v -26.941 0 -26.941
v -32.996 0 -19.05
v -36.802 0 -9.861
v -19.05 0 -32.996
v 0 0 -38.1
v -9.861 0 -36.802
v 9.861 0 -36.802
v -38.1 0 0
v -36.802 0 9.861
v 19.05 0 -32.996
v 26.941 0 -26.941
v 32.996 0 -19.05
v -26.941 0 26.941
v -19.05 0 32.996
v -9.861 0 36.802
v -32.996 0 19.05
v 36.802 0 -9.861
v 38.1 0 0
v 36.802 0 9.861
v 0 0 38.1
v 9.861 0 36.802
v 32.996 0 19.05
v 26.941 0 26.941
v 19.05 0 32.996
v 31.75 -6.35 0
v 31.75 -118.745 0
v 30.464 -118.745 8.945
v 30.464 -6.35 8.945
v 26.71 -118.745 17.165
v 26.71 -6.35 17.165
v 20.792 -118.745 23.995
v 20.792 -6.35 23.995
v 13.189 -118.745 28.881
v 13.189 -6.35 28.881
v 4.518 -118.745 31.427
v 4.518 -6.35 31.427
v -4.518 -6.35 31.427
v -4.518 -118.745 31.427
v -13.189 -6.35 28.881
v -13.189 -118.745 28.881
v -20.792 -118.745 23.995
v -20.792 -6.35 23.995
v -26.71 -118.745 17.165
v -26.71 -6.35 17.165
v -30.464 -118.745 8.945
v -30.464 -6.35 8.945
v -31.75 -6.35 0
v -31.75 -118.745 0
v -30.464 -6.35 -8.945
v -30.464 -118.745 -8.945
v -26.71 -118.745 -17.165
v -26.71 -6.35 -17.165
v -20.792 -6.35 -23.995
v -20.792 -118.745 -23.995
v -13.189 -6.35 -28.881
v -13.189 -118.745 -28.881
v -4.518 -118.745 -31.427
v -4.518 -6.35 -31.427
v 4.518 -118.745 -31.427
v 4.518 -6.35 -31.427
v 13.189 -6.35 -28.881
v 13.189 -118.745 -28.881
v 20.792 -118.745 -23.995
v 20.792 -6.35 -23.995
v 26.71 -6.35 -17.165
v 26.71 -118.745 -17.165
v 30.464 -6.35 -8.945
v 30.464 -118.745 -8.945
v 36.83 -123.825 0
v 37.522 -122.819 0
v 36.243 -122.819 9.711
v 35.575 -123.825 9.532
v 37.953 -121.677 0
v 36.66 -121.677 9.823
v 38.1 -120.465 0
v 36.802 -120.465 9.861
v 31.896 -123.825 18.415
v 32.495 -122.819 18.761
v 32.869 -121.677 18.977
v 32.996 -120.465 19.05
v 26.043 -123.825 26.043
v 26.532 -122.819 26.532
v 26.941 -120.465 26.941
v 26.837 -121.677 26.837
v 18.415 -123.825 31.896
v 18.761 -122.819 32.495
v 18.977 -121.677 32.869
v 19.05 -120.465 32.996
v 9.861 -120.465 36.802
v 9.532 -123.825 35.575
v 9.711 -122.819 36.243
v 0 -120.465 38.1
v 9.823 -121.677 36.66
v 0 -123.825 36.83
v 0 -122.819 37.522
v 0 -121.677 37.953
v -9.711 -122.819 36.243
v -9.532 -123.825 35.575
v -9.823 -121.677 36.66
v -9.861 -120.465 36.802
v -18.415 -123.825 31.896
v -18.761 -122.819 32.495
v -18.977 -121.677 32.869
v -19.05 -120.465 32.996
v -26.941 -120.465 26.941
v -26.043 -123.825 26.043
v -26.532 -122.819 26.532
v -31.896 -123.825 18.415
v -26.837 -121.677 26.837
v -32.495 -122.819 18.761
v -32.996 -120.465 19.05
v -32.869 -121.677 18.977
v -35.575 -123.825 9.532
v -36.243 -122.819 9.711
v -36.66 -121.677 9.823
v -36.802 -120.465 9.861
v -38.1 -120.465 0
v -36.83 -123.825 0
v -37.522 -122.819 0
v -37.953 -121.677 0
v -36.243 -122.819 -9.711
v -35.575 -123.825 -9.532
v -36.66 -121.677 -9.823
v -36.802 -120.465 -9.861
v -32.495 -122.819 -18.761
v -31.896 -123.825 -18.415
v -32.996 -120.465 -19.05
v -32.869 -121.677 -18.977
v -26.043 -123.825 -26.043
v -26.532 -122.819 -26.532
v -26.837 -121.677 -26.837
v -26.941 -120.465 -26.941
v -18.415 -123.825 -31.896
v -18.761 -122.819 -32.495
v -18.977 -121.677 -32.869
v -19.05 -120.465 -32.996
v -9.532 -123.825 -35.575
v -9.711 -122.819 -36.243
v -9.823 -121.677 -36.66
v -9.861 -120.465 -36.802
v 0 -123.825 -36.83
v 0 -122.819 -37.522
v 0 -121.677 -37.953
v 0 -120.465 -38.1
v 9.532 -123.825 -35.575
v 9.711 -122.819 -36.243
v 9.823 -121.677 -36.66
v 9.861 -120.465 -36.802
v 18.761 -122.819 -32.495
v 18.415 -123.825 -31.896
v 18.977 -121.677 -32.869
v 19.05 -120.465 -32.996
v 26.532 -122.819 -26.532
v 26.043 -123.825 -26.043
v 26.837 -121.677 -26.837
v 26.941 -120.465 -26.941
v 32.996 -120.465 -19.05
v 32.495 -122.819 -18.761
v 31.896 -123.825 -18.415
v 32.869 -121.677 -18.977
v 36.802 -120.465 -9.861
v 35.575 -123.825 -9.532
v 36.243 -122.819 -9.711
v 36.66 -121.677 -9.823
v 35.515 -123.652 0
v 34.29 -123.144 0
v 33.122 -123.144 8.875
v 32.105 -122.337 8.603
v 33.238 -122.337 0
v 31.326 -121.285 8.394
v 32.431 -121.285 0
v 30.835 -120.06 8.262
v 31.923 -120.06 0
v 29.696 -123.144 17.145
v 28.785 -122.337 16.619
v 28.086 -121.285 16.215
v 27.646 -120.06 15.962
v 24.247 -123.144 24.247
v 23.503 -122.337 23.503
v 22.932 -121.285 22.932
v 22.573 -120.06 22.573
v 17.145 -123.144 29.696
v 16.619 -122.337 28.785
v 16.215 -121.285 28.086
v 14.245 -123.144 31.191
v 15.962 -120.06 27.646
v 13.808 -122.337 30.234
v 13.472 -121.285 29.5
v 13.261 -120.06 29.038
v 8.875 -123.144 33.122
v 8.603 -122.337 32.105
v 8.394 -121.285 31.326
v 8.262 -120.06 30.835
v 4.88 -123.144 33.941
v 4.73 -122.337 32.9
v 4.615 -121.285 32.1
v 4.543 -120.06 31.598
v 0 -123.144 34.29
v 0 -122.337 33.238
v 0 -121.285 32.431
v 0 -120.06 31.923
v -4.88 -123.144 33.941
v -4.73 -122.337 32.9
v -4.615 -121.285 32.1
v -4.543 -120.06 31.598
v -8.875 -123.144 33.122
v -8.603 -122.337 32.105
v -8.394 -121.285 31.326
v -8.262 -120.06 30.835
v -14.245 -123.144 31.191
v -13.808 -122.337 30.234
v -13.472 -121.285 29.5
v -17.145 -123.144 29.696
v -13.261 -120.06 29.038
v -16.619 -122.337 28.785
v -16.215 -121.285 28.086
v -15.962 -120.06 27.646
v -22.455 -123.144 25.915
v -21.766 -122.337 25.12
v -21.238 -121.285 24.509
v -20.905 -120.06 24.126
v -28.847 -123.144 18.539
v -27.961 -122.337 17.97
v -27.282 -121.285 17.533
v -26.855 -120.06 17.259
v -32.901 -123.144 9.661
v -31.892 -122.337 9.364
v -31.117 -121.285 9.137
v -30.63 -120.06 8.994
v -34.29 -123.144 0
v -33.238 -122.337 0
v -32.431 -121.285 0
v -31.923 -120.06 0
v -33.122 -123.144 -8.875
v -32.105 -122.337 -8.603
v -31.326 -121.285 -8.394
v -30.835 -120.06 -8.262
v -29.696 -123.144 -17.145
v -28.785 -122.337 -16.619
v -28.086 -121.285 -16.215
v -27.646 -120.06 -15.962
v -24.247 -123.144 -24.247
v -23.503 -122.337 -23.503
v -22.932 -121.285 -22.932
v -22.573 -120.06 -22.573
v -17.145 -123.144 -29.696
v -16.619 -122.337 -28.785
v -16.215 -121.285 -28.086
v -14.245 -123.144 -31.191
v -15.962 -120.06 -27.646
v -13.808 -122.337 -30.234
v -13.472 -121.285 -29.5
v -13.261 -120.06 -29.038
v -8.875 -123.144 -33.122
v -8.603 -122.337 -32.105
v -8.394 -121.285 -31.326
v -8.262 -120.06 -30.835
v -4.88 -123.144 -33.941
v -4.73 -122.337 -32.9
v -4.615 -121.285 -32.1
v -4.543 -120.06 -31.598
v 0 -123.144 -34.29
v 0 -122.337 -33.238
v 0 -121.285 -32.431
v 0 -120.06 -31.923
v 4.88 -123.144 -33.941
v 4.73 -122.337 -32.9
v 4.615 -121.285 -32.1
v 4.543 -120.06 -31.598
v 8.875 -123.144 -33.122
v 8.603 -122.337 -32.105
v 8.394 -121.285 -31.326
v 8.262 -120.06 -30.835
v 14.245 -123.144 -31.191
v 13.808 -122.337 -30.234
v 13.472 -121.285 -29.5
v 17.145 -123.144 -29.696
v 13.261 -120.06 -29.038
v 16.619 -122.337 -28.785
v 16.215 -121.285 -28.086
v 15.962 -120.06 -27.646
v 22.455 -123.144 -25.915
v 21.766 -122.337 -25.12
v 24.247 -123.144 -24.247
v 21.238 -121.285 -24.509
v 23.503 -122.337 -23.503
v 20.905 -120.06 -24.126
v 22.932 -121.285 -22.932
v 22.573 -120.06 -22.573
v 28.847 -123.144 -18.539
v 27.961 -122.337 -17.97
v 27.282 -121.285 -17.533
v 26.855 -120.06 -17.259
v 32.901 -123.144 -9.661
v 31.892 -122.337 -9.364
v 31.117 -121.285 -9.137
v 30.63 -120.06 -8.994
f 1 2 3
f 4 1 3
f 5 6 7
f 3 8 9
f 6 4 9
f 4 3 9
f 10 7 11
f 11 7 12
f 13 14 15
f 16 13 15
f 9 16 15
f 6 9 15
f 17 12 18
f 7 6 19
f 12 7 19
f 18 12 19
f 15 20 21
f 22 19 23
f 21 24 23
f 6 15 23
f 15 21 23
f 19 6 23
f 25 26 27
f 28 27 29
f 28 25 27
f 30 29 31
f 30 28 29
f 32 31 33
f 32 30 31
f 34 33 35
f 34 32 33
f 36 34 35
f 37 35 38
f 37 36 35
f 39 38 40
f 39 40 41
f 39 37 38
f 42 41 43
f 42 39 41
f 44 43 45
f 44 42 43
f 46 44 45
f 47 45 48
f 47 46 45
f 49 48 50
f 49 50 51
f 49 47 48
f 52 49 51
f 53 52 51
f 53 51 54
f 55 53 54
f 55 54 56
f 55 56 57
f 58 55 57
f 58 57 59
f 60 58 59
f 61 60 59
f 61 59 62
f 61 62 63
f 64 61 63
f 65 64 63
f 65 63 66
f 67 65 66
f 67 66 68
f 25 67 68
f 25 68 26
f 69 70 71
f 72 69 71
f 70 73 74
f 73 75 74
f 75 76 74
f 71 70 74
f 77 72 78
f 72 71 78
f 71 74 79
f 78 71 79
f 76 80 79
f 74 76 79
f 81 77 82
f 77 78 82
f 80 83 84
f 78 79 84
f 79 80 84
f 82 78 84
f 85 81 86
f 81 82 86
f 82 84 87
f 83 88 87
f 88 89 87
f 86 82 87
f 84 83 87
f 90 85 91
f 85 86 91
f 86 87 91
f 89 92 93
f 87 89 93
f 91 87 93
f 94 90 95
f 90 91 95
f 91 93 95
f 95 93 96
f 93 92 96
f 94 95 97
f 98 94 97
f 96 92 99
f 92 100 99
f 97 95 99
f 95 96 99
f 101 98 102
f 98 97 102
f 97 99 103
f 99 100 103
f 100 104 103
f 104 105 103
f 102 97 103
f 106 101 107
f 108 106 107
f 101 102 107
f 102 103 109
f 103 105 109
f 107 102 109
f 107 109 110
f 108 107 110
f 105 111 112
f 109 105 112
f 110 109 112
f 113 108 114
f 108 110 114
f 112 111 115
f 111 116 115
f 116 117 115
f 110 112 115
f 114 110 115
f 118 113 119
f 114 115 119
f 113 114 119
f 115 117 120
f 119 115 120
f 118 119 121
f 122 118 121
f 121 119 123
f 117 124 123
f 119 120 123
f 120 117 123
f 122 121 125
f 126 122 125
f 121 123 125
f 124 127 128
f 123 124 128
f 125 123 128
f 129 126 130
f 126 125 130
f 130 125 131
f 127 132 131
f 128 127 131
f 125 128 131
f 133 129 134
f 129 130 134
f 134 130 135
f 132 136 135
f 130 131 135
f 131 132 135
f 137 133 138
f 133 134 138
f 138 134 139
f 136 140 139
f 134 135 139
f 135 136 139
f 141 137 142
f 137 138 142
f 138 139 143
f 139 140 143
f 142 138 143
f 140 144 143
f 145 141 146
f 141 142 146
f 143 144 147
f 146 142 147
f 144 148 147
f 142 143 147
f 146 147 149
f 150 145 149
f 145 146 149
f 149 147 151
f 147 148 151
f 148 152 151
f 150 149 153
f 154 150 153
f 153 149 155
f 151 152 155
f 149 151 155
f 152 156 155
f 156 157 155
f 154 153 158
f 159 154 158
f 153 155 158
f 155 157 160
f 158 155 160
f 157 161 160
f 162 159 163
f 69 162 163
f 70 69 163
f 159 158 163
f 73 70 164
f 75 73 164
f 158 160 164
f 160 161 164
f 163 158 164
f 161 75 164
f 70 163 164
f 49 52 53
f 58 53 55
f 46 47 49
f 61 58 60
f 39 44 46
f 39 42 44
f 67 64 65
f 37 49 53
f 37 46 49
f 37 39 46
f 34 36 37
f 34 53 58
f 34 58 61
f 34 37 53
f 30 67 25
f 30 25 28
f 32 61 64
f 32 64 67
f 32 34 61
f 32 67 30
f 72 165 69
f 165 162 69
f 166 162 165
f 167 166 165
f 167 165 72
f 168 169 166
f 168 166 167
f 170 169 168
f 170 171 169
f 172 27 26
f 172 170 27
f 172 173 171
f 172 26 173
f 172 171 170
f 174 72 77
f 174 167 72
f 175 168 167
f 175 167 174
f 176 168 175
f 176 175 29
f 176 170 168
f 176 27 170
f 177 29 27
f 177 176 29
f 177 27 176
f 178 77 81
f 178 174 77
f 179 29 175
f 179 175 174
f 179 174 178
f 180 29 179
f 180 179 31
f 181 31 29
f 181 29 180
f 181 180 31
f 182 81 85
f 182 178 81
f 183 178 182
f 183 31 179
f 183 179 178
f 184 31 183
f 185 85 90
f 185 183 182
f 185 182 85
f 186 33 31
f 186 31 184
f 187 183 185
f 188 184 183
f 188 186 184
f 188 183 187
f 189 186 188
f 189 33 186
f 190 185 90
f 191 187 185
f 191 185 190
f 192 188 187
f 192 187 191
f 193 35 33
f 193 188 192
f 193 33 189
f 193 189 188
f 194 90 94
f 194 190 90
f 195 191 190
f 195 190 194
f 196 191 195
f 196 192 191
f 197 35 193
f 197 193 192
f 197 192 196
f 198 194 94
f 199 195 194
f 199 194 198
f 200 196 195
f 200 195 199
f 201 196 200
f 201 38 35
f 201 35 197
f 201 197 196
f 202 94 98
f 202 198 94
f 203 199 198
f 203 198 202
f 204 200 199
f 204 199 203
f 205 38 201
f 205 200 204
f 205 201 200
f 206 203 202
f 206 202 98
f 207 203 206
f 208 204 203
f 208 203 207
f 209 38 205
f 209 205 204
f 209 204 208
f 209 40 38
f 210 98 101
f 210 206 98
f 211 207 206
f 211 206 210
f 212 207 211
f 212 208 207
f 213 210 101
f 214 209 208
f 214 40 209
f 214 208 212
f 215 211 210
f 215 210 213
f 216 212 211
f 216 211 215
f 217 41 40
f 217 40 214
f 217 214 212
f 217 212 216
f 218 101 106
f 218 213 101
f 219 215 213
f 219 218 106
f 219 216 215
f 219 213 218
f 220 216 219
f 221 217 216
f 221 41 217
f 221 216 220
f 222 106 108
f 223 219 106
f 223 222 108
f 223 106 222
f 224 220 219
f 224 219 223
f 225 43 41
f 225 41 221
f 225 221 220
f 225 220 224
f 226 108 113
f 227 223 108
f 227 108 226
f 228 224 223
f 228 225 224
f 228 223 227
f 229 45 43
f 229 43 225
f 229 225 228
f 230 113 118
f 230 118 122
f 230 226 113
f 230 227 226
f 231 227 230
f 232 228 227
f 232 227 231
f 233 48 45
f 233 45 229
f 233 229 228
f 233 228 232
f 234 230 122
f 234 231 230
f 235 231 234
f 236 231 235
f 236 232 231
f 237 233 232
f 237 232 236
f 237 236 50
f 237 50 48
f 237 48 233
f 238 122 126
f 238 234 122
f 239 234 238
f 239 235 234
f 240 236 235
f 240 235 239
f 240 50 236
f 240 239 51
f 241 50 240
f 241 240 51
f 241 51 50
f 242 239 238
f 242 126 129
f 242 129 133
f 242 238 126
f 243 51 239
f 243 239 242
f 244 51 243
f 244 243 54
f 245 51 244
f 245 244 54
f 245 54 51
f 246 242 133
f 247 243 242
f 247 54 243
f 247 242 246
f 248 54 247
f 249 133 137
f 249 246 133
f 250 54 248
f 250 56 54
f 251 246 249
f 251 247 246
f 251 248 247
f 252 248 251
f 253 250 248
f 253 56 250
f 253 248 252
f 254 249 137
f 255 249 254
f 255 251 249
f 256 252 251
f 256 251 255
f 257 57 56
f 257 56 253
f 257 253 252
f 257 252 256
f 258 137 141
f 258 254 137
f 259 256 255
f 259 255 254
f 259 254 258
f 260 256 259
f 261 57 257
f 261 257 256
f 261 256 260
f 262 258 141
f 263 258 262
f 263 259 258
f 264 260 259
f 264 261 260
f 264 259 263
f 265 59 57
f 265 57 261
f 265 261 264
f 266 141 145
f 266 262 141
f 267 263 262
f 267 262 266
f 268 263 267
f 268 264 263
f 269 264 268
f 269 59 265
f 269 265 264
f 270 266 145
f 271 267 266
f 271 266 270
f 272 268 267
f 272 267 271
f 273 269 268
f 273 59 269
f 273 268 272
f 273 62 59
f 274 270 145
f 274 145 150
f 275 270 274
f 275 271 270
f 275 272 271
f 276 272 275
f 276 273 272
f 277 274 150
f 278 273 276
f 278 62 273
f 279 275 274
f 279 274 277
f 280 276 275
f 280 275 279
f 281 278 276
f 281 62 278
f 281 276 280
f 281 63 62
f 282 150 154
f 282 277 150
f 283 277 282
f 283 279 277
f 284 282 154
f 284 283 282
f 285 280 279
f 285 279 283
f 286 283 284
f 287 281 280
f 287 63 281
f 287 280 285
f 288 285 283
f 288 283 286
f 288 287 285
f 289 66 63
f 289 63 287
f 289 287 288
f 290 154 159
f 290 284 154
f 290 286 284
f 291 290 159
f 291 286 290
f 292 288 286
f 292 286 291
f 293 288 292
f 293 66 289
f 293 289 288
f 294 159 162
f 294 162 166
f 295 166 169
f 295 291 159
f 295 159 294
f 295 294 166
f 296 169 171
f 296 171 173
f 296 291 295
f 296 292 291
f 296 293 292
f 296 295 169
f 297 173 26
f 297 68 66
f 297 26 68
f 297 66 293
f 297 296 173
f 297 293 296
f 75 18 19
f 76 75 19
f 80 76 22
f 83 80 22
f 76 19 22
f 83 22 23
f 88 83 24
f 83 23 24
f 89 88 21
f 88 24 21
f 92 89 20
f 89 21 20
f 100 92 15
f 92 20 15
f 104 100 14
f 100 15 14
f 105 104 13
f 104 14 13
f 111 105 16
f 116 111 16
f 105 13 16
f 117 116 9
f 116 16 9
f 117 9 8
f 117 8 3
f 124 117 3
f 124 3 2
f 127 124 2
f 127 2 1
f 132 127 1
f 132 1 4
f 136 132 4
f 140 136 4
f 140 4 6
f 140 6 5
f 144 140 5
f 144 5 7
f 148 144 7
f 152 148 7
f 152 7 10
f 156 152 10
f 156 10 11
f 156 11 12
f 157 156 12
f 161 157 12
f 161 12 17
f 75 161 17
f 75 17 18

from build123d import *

# Parameters (mm, degrees)
F0_R     = 38.1
F0_R_2   = 31.75
F1_DEPTH = 123.825
F2_R     = 38.1
F3_DEPTH = 6.35
F4_R     = 5.08


# Not quite as in the source:
# - a fillet or chamfer that OpenCascade refuses, or shapes differently, is made with other operations: its cross-section is extruded or revolved along the edge and cut away or added


with BuildPart() as f1:
    # F0 (on Front) → F1 (new body)
    with BuildSketch(Plane.XZ):
        Circle(F0_R)
        Circle(F0_R_2, mode=Mode.SUBTRACT)
    extrude(amount=F1_DEPTH)

    # F2 (on Front) → F3 (join)
    with BuildSketch(Plane.XZ):
        Circle(F2_R)
    extrude(amount=F3_DEPTH)

    # F4
    f4_edges = [f1.edges().sort_by_distance(p)[0] for p in [
        (-31.75, -123.825, 0),
    ]]
    fillet(f4_edges, radius=F4_R)

    # F5: fillet of radius 5.08 on 1 edges, made by hand

    # F5_s1 → F5_t2 (revolve, cut)
    with BuildSketch(Plane.XY):
        with BuildLine():
            ThreePointArc((36.83, -123.825), (37.7719048812, -122.2609470592), (38.1, -120.4648958349))
            Line((38.1, -120.4648958349), (38.1, -123.825))
            Line((38.1, -123.825), (36.83, -123.825))
        make_face()
    revolve(axis=Axis((0, -123.825, 0), (0, -1, 0)), mode=Mode.SUBTRACT)


solid = f1.part
